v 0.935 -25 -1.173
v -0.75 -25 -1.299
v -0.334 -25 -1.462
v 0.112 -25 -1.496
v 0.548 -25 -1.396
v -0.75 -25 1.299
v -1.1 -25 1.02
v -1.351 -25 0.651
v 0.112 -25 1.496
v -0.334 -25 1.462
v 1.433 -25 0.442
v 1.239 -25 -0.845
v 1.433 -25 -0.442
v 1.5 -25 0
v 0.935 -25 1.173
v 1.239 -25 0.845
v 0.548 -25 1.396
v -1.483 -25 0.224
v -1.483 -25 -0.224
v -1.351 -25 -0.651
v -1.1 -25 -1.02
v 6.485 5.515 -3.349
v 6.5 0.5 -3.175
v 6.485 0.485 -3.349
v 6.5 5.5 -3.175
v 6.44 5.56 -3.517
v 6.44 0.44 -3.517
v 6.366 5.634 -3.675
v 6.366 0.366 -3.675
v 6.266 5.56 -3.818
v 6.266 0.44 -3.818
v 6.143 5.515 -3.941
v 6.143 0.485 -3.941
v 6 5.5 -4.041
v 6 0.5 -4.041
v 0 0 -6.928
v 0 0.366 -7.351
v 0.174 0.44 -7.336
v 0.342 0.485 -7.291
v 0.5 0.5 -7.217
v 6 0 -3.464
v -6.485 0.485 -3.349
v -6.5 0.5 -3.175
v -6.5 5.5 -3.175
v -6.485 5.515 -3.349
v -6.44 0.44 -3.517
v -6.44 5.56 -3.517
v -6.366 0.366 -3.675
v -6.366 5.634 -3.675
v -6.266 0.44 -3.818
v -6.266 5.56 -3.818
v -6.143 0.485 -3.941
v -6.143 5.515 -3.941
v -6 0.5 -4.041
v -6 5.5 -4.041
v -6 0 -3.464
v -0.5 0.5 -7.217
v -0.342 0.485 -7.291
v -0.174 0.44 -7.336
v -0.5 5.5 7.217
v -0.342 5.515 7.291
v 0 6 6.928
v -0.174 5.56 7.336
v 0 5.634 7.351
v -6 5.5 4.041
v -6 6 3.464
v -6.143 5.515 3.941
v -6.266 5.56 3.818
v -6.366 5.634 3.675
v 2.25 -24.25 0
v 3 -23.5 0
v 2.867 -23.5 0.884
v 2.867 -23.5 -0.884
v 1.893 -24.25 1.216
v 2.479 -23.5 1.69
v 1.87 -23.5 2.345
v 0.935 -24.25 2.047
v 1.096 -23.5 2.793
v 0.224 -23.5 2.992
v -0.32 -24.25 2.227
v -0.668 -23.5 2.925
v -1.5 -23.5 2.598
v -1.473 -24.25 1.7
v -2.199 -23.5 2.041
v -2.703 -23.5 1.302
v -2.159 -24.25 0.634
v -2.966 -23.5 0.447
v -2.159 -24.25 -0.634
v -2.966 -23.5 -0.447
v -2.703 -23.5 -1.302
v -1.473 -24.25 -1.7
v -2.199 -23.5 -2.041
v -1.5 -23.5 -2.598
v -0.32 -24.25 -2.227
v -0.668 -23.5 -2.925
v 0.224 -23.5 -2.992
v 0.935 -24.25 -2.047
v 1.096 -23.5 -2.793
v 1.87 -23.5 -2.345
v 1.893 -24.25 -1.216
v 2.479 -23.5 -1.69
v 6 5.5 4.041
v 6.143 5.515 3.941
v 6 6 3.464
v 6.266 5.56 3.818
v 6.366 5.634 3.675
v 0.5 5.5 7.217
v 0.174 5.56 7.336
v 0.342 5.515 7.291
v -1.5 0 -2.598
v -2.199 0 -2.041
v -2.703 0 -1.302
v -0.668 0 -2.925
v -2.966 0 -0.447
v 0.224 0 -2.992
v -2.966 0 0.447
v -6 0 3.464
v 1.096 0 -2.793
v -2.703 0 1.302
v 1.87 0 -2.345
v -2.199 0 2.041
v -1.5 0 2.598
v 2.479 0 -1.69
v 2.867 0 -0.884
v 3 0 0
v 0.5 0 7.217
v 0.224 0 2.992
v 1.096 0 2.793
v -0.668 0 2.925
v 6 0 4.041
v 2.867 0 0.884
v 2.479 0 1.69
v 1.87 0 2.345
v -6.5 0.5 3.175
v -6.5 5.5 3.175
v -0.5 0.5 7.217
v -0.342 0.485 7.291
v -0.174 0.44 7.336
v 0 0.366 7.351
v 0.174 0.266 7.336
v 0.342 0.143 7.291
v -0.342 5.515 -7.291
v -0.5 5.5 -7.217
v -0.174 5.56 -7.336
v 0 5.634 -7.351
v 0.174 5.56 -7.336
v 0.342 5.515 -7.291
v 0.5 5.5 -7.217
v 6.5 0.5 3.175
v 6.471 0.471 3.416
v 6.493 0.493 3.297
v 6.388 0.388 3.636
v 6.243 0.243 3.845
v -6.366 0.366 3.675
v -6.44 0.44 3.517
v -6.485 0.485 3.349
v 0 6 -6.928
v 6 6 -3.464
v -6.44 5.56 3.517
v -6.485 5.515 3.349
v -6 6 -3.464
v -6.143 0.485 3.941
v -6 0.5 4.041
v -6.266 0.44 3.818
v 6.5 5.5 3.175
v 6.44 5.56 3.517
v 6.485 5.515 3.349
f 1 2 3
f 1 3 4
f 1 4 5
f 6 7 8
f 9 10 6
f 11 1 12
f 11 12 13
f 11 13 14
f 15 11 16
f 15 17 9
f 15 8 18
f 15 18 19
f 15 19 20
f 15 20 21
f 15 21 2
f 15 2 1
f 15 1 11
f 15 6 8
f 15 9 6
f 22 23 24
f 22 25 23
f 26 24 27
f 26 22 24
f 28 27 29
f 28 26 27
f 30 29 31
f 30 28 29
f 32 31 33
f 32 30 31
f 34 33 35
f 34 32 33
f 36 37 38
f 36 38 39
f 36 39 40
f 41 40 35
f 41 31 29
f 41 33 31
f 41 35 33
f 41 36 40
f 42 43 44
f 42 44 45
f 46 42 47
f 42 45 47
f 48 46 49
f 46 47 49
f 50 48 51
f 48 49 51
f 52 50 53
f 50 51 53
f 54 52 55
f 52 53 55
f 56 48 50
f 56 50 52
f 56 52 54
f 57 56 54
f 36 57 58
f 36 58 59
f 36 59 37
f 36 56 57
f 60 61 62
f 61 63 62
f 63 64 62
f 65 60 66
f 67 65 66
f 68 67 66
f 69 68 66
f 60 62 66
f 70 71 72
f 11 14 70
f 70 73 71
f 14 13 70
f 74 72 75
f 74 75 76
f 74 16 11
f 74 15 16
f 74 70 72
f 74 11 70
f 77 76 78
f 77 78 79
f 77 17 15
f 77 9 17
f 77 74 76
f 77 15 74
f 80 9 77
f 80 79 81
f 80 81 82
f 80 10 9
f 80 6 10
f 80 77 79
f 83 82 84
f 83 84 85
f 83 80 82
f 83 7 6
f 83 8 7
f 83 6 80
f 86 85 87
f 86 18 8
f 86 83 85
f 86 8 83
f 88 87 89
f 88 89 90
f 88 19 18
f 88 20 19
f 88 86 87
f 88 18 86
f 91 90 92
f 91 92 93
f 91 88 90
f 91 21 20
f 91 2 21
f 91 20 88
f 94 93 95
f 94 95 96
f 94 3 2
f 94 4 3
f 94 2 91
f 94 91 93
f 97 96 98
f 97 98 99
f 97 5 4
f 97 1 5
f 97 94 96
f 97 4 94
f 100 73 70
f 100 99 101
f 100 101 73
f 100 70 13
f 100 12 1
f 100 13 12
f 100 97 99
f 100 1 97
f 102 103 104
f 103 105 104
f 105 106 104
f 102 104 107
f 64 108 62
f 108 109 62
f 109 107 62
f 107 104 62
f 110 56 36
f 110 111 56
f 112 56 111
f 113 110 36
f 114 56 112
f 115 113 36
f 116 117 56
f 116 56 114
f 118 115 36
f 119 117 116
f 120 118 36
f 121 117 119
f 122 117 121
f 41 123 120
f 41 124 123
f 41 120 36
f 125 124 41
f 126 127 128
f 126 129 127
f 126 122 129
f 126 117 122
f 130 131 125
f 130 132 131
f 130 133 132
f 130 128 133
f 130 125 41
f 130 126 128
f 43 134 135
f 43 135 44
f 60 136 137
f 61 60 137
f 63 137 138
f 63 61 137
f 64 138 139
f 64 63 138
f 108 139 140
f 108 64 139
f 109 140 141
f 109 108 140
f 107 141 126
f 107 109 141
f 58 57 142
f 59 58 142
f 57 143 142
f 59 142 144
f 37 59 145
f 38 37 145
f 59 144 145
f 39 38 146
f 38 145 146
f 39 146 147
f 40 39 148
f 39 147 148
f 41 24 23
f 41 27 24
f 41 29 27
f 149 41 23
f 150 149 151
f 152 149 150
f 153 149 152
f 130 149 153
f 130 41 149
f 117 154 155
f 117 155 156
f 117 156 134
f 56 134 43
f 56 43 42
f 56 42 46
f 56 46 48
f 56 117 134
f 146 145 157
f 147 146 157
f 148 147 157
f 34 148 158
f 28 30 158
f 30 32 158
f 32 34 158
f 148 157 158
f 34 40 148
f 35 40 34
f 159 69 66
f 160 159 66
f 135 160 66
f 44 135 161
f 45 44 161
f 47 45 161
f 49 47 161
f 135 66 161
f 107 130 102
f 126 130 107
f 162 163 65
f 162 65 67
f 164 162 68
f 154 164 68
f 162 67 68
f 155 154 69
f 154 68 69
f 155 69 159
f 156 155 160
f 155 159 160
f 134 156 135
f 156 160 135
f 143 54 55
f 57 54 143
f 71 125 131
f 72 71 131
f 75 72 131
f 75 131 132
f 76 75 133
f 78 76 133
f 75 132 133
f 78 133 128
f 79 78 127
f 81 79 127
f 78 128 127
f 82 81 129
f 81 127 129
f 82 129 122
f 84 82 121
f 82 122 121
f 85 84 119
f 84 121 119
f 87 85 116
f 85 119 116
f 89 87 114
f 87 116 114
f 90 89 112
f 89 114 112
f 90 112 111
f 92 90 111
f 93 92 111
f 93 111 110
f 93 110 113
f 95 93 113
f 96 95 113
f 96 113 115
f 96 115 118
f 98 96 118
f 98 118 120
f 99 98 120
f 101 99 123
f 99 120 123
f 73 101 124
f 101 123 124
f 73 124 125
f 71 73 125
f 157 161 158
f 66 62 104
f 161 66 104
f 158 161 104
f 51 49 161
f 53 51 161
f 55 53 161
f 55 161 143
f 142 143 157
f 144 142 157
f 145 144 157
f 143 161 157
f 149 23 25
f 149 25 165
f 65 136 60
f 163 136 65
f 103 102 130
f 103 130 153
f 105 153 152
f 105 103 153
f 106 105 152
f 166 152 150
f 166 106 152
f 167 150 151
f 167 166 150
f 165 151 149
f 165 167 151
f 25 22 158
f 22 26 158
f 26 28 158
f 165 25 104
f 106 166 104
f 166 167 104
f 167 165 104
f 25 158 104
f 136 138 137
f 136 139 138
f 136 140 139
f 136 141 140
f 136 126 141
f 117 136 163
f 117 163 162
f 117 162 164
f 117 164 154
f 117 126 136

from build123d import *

# Parameters (mm, degrees)
F0_R     = 4
F1_DEPTH = 6
F3_SIZE  = 0.5
F4_R     = 1
F2_R     = 3
F5_DEPTH = 25
F6_SIZE  = 1.5


with BuildPart() as f1:
    # F0 (on Front) → F1 (new body)
    with BuildSketch(Plane.XZ):
        Polygon((0, 7.5055534995), (-6.5, 3.7527767497), (-6.5, -3.7527767497), (0, -7.5055534995), (6.5, -3.7527767497), (6.5, 3.7527767497), align=None)
        Circle(F0_R, mode=Mode.SUBTRACT)
        Circle(F0_R)
    extrude(amount=-F1_DEPTH)

    # F3
    f3_edges = [f1.edges().sort_by_distance(p)[0] for p in [
        (6.5, 0, 0),
        (-3.25, 0, 5.629165),
        (-6.5, 0, 0),
        (-3.25, 0, -5.629165),
        (3.25, 0, -5.629165),
        (-3.25, 6, 5.629165),
        (-6.5, 6, 0),
        (-3.25, 6, -5.629165),
        (3.25, 6, -5.629165),
        (6.5, 6, 0),
        (3.25, 6, 5.629165),
    ]]
    chamfer(f3_edges, length=F3_SIZE)

    # F4
    f4_edges = [f1.edges().sort_by_distance(p)[0] for p in [
        (0, 3, 7.505553),
        (-6.5, 3, 3.752777),
        (6.5, 3, 3.752777),
        (-6.5, 3, -3.752777),
        (0, 3, -7.505553),
        (6.5, 3, -3.752777),
    ]]
    fillet(f4_edges, radius=F4_R)

    # F2 (on face) → F5 (join)
    with BuildSketch(Plane.XZ):
        Circle(F2_R)
    extrude(amount=F5_DEPTH)

    # F6
    f6_edges = [f1.edges().sort_by_distance(p)[0] for p in [
        (-3, -25, 0),
    ]]
    chamfer(f6_edges, length=F6_SIZE)


solid = f1.part
